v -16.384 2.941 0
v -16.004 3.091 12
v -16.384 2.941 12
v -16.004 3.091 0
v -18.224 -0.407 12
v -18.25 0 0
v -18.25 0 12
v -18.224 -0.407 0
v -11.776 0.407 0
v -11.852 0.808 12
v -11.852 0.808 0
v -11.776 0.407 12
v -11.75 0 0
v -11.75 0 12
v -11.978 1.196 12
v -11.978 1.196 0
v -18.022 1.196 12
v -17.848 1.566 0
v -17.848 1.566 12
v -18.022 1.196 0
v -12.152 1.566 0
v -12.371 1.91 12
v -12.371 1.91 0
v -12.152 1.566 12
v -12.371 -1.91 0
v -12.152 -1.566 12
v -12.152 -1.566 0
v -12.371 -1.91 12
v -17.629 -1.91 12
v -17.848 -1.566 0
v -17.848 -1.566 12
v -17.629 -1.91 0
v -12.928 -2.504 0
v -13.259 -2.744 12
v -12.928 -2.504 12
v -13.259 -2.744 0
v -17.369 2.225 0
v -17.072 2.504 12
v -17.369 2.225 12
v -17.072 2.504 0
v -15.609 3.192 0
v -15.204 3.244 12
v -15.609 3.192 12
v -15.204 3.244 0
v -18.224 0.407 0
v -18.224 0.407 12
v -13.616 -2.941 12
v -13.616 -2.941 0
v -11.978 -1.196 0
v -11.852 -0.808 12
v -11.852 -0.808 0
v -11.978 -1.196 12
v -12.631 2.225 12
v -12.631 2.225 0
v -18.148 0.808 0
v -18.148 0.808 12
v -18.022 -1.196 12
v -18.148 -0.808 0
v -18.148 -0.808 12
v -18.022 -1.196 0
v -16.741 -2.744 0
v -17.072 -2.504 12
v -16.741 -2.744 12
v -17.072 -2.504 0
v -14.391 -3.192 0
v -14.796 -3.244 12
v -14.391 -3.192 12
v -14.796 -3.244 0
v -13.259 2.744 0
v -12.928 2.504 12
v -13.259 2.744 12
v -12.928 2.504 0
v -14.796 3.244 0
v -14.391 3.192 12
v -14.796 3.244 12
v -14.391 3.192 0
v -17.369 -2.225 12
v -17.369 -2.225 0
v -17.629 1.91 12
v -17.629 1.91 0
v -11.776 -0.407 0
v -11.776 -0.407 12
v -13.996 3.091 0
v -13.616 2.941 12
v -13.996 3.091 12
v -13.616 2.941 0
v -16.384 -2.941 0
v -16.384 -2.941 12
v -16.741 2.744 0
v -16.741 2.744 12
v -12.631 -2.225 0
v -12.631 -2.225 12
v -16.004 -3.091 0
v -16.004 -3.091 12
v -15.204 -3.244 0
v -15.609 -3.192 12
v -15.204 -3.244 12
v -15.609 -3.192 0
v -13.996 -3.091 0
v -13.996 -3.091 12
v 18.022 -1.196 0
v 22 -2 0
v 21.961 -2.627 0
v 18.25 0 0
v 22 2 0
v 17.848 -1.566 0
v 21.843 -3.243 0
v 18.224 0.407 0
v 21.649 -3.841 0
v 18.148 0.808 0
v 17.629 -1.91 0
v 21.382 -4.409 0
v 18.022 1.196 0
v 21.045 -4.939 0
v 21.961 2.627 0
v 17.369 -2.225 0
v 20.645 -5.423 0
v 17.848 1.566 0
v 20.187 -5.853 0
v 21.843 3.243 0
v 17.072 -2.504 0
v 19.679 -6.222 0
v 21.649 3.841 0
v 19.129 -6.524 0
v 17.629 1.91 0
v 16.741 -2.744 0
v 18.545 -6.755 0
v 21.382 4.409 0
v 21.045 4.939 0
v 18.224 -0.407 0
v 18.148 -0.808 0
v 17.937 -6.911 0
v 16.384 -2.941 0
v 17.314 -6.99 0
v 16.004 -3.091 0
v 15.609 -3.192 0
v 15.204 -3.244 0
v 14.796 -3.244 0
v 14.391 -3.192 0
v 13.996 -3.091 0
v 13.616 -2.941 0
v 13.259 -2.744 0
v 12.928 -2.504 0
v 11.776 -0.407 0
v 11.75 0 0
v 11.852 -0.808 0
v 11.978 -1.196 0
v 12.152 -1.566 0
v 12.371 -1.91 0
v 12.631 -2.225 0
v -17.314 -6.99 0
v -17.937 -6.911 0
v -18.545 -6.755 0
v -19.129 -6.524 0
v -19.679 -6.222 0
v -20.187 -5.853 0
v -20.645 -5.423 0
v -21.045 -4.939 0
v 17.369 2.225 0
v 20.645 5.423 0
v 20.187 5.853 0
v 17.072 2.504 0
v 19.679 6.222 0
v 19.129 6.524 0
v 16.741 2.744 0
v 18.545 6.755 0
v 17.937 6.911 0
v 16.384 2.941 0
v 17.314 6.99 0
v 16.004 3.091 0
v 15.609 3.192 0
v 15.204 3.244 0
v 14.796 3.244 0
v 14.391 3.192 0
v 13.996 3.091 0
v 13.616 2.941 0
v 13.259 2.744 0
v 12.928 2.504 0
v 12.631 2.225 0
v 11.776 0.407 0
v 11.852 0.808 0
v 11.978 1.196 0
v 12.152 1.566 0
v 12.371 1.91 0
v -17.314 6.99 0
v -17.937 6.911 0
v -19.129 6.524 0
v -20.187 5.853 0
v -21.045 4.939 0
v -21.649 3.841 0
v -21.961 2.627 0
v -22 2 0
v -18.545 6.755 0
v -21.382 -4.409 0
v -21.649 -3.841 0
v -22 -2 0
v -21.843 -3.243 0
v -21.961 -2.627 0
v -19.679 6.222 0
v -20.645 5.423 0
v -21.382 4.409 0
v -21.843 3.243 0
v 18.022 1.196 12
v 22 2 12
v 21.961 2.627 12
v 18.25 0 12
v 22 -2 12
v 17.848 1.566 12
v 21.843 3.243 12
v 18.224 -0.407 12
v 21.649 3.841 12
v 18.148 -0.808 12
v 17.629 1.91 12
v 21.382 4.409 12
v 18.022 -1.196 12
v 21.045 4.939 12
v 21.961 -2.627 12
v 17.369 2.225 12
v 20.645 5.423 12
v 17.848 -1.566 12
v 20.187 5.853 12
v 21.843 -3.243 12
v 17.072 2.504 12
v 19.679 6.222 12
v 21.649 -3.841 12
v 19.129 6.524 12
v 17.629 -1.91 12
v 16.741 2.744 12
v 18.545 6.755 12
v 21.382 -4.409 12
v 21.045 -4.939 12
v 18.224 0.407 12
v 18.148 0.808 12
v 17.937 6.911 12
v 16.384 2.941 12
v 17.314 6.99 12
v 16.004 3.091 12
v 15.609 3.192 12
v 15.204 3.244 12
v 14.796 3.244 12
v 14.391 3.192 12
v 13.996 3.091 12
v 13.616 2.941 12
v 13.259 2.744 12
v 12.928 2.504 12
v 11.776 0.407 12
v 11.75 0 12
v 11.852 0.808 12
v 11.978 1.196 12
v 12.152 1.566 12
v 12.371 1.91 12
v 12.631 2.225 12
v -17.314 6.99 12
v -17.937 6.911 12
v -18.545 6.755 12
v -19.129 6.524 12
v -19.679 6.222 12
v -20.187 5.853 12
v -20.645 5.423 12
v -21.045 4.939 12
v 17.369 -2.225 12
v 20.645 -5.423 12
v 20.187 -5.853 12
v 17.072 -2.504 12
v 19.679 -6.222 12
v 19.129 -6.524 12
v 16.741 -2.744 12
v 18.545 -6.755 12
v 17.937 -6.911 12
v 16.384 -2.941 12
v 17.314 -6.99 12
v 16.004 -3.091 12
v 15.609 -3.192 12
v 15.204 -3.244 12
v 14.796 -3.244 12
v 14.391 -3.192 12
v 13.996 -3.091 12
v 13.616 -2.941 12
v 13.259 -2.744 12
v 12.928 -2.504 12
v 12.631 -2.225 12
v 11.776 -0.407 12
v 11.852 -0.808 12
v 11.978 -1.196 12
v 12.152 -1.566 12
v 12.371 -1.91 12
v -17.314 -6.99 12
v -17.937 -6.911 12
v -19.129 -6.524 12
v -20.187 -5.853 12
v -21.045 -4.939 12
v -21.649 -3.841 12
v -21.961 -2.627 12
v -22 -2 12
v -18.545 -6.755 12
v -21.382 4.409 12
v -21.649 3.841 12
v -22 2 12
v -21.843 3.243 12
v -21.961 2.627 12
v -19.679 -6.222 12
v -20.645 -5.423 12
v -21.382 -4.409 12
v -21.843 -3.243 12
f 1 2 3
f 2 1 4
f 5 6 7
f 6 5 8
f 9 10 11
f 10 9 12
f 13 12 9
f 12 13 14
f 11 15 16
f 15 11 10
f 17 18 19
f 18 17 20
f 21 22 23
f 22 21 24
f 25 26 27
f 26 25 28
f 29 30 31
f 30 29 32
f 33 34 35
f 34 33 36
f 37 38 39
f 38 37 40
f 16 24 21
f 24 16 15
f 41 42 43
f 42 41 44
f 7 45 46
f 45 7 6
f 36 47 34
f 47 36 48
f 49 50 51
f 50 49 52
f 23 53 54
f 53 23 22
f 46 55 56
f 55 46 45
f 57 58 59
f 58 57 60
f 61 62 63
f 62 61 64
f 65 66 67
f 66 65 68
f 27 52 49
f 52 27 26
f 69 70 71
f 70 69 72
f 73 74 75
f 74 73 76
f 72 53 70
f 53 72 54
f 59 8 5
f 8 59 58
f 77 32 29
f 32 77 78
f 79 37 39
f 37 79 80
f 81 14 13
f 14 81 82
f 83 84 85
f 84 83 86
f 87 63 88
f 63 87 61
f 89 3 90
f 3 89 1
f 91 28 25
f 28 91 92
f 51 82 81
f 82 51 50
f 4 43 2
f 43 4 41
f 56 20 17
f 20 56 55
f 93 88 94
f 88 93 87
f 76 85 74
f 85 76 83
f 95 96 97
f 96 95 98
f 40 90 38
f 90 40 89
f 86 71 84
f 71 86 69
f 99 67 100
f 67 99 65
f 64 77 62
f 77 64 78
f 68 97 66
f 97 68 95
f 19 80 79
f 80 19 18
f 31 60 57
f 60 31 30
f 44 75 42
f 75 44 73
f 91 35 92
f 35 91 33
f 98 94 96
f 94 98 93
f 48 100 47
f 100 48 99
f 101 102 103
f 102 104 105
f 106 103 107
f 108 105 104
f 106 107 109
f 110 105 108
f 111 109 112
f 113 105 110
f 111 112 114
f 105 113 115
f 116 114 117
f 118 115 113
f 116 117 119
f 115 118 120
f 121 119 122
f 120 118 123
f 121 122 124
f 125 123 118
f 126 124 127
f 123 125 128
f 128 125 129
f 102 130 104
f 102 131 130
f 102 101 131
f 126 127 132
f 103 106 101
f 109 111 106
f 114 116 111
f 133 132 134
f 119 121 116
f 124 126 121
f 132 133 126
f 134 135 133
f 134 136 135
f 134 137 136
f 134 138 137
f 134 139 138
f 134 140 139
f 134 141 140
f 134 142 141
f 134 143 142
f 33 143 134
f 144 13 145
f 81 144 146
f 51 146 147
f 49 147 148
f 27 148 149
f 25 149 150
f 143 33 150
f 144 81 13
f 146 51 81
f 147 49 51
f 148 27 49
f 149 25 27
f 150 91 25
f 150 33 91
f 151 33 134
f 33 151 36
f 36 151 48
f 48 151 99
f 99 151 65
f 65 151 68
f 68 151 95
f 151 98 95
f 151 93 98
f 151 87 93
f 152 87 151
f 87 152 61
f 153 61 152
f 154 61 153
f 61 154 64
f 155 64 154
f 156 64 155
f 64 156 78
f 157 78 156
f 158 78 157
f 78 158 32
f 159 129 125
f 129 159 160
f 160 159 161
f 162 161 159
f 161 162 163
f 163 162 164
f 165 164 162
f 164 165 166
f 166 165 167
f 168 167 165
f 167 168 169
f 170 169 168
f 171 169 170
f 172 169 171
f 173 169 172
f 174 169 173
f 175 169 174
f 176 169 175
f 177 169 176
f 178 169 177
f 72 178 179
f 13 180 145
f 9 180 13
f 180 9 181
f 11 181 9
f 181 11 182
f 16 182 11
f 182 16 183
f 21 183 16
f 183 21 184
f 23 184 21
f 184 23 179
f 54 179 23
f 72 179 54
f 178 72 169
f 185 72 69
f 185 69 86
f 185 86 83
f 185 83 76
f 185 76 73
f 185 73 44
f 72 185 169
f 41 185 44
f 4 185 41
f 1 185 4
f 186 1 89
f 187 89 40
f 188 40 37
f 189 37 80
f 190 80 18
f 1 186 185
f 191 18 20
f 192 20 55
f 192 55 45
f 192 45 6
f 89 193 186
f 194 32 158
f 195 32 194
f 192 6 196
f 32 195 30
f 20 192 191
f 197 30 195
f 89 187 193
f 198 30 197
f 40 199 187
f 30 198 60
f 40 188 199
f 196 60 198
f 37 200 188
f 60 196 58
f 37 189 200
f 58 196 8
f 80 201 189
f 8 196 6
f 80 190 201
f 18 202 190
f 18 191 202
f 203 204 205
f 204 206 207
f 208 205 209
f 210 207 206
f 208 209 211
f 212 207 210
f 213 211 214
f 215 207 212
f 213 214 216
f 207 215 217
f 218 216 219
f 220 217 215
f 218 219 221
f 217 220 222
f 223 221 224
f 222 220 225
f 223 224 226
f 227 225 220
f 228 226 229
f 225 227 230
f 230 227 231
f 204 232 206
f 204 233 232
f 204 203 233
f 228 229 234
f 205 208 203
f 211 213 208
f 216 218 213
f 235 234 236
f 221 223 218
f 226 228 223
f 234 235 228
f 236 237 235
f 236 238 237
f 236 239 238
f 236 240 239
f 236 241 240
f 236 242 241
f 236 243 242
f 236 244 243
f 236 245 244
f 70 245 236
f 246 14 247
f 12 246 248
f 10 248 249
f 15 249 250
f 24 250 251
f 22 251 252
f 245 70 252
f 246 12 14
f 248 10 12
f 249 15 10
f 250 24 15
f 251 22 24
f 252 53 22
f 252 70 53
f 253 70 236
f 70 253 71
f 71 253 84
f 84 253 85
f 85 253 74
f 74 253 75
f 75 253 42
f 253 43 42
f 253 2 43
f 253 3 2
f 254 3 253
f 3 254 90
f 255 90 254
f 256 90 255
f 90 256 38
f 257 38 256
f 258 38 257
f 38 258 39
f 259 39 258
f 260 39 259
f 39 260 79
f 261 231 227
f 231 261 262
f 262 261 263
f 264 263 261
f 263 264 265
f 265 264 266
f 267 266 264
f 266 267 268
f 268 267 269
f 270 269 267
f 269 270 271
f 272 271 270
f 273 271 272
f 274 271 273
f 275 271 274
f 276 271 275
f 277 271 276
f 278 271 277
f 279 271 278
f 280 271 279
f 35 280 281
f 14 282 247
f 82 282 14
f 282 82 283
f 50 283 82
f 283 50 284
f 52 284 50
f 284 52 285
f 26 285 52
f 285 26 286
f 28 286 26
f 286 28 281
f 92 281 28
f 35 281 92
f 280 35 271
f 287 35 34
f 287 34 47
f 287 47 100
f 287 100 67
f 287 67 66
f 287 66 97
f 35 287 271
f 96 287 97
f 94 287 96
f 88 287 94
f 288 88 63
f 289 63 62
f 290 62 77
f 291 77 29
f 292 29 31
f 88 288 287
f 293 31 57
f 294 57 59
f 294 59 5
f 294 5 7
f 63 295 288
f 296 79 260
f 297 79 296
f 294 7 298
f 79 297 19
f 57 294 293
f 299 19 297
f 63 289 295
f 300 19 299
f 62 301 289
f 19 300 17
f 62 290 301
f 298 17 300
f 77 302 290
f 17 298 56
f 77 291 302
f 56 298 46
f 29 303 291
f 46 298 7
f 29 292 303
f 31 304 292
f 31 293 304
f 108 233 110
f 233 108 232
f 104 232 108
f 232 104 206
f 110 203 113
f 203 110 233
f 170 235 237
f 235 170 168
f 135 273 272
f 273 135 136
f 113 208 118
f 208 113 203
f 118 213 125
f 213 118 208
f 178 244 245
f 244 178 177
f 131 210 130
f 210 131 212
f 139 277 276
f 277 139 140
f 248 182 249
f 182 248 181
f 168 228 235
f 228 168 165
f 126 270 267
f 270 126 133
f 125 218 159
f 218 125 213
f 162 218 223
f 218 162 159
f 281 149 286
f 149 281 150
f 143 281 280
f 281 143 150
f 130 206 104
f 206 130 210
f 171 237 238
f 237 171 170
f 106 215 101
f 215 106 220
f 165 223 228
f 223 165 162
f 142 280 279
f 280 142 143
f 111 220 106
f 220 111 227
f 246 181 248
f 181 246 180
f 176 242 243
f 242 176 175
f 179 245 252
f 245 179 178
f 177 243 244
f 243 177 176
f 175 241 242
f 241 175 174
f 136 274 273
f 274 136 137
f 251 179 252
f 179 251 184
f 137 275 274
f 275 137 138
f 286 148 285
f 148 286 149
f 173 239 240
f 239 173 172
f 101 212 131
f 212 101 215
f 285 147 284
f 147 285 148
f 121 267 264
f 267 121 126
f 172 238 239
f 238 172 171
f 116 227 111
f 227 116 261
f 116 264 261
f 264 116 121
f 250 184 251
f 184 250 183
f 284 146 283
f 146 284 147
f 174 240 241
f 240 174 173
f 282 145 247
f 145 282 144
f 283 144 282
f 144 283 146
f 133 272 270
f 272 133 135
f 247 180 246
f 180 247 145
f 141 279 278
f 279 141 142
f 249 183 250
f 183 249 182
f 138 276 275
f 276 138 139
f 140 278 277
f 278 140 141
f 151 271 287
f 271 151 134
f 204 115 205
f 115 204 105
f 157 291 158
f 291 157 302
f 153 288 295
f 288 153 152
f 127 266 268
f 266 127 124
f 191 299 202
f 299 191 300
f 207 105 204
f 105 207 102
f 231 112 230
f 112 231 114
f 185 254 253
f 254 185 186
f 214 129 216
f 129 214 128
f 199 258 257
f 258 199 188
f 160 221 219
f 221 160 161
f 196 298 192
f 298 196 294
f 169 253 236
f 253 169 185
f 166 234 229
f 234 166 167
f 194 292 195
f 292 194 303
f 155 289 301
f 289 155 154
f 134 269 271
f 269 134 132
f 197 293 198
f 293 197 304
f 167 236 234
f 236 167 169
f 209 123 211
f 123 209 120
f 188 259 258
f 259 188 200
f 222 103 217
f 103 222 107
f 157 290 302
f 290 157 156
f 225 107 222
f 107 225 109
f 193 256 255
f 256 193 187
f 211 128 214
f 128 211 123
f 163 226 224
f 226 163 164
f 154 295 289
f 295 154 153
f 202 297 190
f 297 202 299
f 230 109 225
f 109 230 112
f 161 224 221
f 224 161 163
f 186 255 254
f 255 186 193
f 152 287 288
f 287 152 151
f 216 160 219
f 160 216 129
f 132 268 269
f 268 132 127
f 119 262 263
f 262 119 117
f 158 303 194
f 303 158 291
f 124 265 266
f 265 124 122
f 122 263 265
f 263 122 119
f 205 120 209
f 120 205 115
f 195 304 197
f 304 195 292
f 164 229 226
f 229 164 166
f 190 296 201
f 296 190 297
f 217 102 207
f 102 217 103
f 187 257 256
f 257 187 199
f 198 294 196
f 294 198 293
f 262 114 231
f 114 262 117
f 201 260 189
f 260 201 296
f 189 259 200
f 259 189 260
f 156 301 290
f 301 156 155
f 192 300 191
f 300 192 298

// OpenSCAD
$fn = 50;


difference() {
	union() {
		hull() {
			translate(v = [-17.0000000000, 2.0000000000, 0]) {
				cylinder(h = 12, r = 5);
			}
			translate(v = [17.0000000000, 2.0000000000, 0]) {
				cylinder(h = 12, r = 5);
			}
			translate(v = [-17.0000000000, -2.0000000000, 0]) {
				cylinder(h = 12, r = 5);
			}
			translate(v = [17.0000000000, -2.0000000000, 0]) {
				cylinder(h = 12, r = 5);
			}
		}
	}
	union() {
		translate(v = [-15.0000000000, 0.0000000000, 0]) {
			cylinder(h = 12, r = 3.2500000000);
		}
		translate(v = [15.0000000000, 0.0000000000, 0]) {
			cylinder(h = 12, r = 3.2500000000);
		}
		translate(v = [-15.0000000000, 0.0000000000, 0]) {
			cylinder(h = 12, r = 1.8000000000);
		}
		translate(v = [15.0000000000, 0.0000000000, 0]) {
			cylinder(h = 12, r = 1.8000000000);
		}
		translate(v = [-15.0000000000, 0.0000000000, 0]) {
			cylinder(h = 12, r = 1.8000000000);
		}
		translate(v = [15.0000000000, 0.0000000000, 0]) {
			cylinder(h = 12, r = 1.8000000000);
		}
		translate(v = [-15.0000000000, 0.0000000000, 0]) {
			cylinder(h = 12, r = 1.8000000000);
		}
		translate(v = [15.0000000000, 0.0000000000, 0]) {
			cylinder(h = 12, r = 1.8000000000);
		}
	}
}
